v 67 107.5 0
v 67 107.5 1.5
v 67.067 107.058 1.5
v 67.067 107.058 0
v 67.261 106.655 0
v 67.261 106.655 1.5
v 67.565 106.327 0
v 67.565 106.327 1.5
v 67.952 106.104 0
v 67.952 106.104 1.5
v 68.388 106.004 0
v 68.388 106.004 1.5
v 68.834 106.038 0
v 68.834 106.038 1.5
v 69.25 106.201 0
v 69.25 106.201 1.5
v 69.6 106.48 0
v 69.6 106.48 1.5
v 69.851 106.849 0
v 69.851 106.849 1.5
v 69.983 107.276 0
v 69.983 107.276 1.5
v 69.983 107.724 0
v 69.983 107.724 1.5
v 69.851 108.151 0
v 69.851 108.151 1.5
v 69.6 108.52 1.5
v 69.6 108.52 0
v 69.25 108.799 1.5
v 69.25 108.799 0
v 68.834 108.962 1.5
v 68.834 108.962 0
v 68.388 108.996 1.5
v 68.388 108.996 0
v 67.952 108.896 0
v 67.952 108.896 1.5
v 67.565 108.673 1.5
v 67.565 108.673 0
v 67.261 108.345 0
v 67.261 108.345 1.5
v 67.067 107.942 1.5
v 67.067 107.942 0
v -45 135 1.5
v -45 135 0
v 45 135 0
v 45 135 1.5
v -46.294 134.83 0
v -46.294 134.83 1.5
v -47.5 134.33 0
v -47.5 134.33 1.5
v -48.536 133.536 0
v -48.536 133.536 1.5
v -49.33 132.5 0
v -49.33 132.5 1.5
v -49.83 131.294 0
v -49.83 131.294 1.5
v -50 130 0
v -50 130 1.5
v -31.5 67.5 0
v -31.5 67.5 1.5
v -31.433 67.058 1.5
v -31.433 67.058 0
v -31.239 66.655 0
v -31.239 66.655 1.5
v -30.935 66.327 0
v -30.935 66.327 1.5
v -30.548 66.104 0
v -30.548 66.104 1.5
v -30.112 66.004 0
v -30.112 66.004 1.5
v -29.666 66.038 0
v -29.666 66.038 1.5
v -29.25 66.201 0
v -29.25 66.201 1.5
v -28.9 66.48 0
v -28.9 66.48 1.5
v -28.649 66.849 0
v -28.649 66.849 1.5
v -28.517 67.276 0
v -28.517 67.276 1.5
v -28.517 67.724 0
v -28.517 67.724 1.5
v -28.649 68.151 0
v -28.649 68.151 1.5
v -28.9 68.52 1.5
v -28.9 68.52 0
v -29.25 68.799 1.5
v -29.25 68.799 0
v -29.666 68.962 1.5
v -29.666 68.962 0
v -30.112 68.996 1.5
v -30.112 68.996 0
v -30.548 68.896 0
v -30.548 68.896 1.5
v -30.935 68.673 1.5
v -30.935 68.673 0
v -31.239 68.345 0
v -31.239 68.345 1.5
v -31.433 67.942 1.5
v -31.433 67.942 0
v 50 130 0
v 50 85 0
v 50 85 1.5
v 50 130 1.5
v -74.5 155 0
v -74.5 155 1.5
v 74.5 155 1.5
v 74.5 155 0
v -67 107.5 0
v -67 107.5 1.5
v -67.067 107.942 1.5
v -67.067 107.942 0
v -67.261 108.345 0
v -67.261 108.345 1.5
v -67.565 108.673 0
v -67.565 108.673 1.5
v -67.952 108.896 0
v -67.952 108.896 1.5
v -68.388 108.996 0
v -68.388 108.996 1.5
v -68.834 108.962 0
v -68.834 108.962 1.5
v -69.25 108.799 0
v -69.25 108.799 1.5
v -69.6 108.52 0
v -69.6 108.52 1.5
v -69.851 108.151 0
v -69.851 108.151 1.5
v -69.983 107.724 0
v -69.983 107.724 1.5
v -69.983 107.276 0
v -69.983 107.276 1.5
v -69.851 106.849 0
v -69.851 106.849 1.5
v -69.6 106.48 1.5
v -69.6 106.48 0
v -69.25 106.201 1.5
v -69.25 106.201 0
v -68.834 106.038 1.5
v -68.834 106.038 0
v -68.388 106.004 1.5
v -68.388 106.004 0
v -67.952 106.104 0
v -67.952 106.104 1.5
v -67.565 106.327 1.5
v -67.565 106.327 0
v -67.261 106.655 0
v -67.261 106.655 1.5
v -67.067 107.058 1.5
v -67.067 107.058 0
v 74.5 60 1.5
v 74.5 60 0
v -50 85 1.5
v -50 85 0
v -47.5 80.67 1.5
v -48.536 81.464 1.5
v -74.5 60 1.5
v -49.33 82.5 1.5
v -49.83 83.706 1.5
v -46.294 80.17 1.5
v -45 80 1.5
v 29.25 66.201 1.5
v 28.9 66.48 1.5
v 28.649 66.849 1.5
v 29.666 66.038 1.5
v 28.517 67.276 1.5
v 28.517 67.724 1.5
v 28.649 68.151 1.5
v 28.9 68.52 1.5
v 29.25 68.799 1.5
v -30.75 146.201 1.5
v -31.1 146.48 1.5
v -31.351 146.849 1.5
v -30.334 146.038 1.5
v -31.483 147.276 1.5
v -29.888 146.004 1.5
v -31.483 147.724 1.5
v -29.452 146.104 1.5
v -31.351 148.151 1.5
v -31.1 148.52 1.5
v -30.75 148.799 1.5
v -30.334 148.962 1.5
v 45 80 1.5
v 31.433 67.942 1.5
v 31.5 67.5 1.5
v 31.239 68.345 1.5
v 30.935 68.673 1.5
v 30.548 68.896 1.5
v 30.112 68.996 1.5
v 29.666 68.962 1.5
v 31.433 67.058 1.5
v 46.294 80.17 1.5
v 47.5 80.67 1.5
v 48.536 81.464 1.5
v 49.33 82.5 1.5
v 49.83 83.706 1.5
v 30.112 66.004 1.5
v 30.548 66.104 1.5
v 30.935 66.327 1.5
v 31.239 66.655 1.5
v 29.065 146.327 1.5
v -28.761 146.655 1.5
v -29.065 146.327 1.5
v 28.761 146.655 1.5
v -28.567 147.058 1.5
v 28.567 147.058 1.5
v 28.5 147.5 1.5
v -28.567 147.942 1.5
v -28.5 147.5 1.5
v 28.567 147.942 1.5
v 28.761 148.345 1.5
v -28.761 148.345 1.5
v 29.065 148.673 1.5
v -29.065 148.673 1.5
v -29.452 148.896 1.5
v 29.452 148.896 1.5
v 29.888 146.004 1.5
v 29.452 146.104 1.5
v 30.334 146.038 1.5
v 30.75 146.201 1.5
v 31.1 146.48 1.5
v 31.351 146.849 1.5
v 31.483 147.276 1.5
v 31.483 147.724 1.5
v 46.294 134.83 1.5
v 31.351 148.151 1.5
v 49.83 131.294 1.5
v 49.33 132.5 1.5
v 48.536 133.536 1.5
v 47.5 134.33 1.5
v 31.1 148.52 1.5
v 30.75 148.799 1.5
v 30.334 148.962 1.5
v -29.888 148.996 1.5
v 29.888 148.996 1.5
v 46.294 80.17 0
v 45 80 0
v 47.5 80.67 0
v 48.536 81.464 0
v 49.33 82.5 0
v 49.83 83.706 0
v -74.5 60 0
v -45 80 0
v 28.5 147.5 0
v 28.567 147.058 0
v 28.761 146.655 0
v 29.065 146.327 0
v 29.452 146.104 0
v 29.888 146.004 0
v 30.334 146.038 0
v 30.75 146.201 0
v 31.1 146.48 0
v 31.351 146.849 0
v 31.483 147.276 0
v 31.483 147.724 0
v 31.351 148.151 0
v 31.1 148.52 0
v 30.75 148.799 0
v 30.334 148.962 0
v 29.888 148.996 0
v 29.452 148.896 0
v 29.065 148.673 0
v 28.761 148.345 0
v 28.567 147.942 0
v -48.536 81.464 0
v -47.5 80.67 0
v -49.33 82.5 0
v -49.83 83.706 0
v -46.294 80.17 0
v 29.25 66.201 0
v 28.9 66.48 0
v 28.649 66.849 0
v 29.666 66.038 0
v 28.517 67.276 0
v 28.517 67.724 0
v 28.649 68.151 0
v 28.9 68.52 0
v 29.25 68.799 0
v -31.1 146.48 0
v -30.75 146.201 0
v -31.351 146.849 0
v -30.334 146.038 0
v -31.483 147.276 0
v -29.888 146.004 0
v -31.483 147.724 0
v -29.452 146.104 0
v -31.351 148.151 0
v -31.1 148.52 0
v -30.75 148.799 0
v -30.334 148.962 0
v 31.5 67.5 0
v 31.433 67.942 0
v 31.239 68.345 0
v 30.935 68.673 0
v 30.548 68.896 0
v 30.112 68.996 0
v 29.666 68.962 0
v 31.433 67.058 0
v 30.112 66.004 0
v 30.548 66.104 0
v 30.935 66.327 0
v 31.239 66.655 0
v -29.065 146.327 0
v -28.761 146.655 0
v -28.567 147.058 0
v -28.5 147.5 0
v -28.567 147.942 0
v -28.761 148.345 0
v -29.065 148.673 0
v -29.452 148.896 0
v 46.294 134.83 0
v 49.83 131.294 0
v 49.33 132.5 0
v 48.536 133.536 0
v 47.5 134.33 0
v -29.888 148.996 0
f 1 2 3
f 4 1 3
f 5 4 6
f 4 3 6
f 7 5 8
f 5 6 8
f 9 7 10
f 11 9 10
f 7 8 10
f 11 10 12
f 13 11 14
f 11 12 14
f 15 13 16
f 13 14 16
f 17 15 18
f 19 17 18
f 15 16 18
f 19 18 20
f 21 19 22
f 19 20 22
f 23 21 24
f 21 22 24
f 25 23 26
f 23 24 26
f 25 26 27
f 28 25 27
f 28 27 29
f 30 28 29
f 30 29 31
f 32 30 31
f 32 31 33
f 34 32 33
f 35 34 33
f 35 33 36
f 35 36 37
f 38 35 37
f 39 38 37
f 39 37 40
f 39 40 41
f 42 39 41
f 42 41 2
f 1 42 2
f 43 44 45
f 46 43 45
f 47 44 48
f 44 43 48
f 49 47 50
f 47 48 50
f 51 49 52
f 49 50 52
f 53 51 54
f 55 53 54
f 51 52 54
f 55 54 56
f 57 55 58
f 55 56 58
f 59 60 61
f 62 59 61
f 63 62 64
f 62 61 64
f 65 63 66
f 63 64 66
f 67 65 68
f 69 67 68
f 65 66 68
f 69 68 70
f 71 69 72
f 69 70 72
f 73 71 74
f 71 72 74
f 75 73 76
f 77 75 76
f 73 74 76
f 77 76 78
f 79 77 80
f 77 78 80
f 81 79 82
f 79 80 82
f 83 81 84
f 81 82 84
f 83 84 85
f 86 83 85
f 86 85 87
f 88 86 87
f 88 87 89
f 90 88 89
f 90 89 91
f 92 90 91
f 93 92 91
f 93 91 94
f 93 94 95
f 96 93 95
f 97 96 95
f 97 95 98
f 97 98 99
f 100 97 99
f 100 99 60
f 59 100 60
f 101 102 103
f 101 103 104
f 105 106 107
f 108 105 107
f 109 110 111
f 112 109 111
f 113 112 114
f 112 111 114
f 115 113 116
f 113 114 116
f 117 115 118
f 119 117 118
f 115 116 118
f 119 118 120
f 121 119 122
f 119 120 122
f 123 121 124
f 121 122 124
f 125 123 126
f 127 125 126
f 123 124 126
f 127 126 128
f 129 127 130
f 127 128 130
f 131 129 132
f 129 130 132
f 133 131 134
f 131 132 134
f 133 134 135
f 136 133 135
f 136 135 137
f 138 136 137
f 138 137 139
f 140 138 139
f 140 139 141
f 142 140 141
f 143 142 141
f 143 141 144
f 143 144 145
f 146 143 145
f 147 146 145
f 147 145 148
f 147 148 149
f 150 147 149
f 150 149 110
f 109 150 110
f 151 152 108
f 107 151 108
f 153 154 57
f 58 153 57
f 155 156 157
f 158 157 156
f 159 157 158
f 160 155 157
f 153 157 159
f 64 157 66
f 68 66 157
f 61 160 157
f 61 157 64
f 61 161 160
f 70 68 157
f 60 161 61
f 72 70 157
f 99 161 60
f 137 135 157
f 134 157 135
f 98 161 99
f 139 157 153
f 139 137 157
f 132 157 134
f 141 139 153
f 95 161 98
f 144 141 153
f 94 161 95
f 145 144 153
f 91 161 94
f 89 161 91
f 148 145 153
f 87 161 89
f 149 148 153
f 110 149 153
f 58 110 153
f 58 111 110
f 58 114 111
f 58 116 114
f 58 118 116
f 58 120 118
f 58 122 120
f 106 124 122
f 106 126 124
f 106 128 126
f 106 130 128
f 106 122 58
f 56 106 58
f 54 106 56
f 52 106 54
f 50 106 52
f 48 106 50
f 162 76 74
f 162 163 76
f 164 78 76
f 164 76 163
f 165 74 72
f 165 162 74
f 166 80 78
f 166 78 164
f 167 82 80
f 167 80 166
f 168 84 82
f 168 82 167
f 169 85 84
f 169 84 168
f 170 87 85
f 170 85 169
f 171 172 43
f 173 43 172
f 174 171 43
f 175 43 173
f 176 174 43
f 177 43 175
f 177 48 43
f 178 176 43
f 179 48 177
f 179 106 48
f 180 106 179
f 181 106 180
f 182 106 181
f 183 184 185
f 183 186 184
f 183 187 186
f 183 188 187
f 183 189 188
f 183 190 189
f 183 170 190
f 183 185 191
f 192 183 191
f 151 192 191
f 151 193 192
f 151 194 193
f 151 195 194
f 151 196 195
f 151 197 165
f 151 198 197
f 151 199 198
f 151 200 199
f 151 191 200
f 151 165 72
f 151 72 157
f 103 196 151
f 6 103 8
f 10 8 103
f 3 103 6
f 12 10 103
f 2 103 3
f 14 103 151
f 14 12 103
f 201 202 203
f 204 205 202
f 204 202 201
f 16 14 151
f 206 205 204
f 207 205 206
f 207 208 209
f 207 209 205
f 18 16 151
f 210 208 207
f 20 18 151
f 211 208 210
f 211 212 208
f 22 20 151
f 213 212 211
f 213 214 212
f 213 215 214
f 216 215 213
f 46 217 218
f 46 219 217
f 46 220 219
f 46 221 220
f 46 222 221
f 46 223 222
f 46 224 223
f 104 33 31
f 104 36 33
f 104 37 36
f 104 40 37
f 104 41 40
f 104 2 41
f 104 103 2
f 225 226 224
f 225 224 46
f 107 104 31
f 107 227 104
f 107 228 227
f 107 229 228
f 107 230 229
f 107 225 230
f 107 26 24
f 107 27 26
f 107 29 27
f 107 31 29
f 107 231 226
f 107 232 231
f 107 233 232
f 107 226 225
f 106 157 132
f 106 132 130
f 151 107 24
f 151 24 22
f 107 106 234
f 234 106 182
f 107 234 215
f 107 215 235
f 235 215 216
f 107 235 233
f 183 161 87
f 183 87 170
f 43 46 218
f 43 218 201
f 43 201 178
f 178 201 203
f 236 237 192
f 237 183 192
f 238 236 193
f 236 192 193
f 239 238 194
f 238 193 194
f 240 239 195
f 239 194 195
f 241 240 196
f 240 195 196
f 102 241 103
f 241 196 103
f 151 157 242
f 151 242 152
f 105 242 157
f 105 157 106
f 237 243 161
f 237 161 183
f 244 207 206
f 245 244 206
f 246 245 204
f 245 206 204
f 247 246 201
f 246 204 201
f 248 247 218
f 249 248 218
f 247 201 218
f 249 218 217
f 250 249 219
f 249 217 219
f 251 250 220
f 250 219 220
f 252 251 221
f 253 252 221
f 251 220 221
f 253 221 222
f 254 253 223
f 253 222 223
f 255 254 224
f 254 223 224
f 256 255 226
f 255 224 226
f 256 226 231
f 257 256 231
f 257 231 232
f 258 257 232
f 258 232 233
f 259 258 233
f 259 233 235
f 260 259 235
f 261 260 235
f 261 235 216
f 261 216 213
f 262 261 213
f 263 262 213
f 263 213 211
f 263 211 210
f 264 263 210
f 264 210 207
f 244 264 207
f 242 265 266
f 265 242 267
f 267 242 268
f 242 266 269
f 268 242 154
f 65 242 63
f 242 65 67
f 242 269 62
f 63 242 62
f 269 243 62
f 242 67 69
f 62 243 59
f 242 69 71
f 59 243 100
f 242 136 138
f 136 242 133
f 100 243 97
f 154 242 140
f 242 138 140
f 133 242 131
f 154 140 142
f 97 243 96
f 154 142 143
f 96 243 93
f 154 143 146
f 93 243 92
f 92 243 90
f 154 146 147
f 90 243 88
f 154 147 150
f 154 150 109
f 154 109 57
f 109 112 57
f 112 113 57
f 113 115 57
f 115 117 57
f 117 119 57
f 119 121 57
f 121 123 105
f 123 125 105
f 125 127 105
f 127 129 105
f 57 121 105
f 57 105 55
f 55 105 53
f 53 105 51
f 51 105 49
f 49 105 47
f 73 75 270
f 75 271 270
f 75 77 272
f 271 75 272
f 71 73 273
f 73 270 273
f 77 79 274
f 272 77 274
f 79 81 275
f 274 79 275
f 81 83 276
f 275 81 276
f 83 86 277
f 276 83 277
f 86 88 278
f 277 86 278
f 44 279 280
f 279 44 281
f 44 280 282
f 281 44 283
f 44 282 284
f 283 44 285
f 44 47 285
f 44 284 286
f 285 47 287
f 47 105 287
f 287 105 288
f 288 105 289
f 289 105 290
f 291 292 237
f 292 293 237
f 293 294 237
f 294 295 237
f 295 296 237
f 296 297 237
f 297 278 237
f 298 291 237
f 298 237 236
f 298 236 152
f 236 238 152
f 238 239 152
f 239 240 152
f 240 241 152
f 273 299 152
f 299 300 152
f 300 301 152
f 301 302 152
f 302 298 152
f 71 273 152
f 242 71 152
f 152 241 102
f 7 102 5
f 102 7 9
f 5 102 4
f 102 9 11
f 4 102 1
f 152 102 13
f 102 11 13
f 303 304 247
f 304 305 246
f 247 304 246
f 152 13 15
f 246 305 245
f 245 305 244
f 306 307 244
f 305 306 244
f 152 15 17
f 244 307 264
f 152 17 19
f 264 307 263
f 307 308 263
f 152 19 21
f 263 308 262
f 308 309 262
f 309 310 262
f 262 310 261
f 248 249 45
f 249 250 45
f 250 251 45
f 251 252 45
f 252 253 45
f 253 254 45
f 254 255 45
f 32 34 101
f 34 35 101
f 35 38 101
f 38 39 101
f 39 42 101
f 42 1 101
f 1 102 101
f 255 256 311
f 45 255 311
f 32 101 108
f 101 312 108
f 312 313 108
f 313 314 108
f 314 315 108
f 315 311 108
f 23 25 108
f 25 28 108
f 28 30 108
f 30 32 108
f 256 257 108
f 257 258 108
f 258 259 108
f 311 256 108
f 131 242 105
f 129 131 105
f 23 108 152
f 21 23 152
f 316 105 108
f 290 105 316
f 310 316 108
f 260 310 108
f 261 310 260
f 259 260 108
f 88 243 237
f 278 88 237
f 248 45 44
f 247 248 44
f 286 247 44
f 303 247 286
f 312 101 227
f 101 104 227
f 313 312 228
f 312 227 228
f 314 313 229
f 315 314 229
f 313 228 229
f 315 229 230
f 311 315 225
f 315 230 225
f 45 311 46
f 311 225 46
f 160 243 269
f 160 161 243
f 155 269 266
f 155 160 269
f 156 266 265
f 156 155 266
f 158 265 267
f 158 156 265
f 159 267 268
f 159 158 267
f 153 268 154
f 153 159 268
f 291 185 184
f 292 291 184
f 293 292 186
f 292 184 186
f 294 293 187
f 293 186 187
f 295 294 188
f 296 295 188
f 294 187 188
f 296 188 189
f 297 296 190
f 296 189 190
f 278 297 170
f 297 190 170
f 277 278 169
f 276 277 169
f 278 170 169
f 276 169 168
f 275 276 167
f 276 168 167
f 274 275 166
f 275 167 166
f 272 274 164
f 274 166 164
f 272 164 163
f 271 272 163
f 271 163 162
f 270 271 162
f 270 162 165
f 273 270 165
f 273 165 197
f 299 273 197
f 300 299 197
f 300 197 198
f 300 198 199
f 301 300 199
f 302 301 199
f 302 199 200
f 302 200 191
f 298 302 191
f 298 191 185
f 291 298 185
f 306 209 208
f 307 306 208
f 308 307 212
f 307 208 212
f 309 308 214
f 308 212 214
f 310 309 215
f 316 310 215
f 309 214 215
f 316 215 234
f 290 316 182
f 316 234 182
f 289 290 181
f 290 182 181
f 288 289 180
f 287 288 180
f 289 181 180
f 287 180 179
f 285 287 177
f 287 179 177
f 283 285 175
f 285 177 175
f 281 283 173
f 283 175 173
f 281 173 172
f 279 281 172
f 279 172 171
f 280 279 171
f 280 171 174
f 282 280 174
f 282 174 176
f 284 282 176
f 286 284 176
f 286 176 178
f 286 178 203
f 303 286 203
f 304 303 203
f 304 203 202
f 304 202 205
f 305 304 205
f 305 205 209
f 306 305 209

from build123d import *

# Parameters (mm, degrees)
ESQUISSE1_W             = 149
ESQUISSE1_H             = 165
ESQUISSE1_W_2           = 100
ESQUISSE1_H_2           = 55
BOSS_EXTRU_1_DEPTH      = 1.5
CONG_1_R                = 5
ESQUISSE2_R             = 1.5
ENL_V_MAT_EXTRU_1_DEPTH = 182.045574373
ESQUISSE3_R             = 1.5
ESQUISSE3_W             = 149
ESQUISSE3_H             = 10
ESQUISSE3_H_2           = 60
ENL_V_MAT_EXTRU_2_DEPTH = 182.045574373


with BuildPart() as part:
    # Esquisse1 → Boss.-Extru.1 (new body)
    with BuildSketch(Plane.XY):
        with Locations((0, 82.5)):
            Rectangle(ESQUISSE1_W, ESQUISSE1_H)
        with Locations((0, 107.5)):
            Rectangle(ESQUISSE1_W_2, ESQUISSE1_H_2, mode=Mode.SUBTRACT)
    extrude(amount=BOSS_EXTRU_1_DEPTH)

    # Congé1
    cong_1_edges = [part.edges().sort_by_distance(p)[0] for p in [
        (-50, 135, 0.75),
        (-50, 80, 0.75),
        (50, 80, 0.75),
        (50, 135, 0.75),
    ]]
    fillet(cong_1_edges, radius=CONG_1_R)

    # Esquisse2 → Enlèv. mat.-Extru.1 (cut, through all)
    with BuildSketch(Plane.XY.offset(1.5)):
        with Locations((-30, 147.5)):
            Circle(ESQUISSE2_R)
        with Locations(Location((-30, 67.5, 0), (0, 0, 180))):
            Circle(ESQUISSE2_R)
        with Locations((30, 67.5)):
            Circle(ESQUISSE2_R)
        with Locations(Location((30, 147.5, 0), (0, 0, 180))):
            Circle(ESQUISSE2_R)
        with Locations((-55, 160)):
            Circle(ESQUISSE2_R)
        with Locations(Location((-55, 5, 0), (0, 0, 180))):
            Circle(ESQUISSE2_R)
        with Locations((55, 5)):
            Circle(ESQUISSE2_R)
        with Locations(Location((55, 160, 0), (0, 0, 180))):
            Circle(ESQUISSE2_R)
    extrude(amount=-ENL_V_MAT_EXTRU_1_DEPTH, mode=Mode.SUBTRACT)

    # Esquisse3 → Enlèv. mat.-Extru.2 (cut, through all)
    with BuildSketch(Plane.XY.offset(1.5)):
        with Locations((-68.5, 107.5)):
            Circle(ESQUISSE3_R)
        with Locations(Location((68.5, 107.5, 0), (0, 0, 180))):
            Circle(ESQUISSE3_R)
        with Locations((0, 160)):
            Rectangle(ESQUISSE3_W, ESQUISSE3_H)
        with Locations((0, 30)):
            Rectangle(ESQUISSE3_W, ESQUISSE3_H_2)
    extrude(amount=-ENL_V_MAT_EXTRU_2_DEPTH, mode=Mode.SUBTRACT)


solid = part.part
